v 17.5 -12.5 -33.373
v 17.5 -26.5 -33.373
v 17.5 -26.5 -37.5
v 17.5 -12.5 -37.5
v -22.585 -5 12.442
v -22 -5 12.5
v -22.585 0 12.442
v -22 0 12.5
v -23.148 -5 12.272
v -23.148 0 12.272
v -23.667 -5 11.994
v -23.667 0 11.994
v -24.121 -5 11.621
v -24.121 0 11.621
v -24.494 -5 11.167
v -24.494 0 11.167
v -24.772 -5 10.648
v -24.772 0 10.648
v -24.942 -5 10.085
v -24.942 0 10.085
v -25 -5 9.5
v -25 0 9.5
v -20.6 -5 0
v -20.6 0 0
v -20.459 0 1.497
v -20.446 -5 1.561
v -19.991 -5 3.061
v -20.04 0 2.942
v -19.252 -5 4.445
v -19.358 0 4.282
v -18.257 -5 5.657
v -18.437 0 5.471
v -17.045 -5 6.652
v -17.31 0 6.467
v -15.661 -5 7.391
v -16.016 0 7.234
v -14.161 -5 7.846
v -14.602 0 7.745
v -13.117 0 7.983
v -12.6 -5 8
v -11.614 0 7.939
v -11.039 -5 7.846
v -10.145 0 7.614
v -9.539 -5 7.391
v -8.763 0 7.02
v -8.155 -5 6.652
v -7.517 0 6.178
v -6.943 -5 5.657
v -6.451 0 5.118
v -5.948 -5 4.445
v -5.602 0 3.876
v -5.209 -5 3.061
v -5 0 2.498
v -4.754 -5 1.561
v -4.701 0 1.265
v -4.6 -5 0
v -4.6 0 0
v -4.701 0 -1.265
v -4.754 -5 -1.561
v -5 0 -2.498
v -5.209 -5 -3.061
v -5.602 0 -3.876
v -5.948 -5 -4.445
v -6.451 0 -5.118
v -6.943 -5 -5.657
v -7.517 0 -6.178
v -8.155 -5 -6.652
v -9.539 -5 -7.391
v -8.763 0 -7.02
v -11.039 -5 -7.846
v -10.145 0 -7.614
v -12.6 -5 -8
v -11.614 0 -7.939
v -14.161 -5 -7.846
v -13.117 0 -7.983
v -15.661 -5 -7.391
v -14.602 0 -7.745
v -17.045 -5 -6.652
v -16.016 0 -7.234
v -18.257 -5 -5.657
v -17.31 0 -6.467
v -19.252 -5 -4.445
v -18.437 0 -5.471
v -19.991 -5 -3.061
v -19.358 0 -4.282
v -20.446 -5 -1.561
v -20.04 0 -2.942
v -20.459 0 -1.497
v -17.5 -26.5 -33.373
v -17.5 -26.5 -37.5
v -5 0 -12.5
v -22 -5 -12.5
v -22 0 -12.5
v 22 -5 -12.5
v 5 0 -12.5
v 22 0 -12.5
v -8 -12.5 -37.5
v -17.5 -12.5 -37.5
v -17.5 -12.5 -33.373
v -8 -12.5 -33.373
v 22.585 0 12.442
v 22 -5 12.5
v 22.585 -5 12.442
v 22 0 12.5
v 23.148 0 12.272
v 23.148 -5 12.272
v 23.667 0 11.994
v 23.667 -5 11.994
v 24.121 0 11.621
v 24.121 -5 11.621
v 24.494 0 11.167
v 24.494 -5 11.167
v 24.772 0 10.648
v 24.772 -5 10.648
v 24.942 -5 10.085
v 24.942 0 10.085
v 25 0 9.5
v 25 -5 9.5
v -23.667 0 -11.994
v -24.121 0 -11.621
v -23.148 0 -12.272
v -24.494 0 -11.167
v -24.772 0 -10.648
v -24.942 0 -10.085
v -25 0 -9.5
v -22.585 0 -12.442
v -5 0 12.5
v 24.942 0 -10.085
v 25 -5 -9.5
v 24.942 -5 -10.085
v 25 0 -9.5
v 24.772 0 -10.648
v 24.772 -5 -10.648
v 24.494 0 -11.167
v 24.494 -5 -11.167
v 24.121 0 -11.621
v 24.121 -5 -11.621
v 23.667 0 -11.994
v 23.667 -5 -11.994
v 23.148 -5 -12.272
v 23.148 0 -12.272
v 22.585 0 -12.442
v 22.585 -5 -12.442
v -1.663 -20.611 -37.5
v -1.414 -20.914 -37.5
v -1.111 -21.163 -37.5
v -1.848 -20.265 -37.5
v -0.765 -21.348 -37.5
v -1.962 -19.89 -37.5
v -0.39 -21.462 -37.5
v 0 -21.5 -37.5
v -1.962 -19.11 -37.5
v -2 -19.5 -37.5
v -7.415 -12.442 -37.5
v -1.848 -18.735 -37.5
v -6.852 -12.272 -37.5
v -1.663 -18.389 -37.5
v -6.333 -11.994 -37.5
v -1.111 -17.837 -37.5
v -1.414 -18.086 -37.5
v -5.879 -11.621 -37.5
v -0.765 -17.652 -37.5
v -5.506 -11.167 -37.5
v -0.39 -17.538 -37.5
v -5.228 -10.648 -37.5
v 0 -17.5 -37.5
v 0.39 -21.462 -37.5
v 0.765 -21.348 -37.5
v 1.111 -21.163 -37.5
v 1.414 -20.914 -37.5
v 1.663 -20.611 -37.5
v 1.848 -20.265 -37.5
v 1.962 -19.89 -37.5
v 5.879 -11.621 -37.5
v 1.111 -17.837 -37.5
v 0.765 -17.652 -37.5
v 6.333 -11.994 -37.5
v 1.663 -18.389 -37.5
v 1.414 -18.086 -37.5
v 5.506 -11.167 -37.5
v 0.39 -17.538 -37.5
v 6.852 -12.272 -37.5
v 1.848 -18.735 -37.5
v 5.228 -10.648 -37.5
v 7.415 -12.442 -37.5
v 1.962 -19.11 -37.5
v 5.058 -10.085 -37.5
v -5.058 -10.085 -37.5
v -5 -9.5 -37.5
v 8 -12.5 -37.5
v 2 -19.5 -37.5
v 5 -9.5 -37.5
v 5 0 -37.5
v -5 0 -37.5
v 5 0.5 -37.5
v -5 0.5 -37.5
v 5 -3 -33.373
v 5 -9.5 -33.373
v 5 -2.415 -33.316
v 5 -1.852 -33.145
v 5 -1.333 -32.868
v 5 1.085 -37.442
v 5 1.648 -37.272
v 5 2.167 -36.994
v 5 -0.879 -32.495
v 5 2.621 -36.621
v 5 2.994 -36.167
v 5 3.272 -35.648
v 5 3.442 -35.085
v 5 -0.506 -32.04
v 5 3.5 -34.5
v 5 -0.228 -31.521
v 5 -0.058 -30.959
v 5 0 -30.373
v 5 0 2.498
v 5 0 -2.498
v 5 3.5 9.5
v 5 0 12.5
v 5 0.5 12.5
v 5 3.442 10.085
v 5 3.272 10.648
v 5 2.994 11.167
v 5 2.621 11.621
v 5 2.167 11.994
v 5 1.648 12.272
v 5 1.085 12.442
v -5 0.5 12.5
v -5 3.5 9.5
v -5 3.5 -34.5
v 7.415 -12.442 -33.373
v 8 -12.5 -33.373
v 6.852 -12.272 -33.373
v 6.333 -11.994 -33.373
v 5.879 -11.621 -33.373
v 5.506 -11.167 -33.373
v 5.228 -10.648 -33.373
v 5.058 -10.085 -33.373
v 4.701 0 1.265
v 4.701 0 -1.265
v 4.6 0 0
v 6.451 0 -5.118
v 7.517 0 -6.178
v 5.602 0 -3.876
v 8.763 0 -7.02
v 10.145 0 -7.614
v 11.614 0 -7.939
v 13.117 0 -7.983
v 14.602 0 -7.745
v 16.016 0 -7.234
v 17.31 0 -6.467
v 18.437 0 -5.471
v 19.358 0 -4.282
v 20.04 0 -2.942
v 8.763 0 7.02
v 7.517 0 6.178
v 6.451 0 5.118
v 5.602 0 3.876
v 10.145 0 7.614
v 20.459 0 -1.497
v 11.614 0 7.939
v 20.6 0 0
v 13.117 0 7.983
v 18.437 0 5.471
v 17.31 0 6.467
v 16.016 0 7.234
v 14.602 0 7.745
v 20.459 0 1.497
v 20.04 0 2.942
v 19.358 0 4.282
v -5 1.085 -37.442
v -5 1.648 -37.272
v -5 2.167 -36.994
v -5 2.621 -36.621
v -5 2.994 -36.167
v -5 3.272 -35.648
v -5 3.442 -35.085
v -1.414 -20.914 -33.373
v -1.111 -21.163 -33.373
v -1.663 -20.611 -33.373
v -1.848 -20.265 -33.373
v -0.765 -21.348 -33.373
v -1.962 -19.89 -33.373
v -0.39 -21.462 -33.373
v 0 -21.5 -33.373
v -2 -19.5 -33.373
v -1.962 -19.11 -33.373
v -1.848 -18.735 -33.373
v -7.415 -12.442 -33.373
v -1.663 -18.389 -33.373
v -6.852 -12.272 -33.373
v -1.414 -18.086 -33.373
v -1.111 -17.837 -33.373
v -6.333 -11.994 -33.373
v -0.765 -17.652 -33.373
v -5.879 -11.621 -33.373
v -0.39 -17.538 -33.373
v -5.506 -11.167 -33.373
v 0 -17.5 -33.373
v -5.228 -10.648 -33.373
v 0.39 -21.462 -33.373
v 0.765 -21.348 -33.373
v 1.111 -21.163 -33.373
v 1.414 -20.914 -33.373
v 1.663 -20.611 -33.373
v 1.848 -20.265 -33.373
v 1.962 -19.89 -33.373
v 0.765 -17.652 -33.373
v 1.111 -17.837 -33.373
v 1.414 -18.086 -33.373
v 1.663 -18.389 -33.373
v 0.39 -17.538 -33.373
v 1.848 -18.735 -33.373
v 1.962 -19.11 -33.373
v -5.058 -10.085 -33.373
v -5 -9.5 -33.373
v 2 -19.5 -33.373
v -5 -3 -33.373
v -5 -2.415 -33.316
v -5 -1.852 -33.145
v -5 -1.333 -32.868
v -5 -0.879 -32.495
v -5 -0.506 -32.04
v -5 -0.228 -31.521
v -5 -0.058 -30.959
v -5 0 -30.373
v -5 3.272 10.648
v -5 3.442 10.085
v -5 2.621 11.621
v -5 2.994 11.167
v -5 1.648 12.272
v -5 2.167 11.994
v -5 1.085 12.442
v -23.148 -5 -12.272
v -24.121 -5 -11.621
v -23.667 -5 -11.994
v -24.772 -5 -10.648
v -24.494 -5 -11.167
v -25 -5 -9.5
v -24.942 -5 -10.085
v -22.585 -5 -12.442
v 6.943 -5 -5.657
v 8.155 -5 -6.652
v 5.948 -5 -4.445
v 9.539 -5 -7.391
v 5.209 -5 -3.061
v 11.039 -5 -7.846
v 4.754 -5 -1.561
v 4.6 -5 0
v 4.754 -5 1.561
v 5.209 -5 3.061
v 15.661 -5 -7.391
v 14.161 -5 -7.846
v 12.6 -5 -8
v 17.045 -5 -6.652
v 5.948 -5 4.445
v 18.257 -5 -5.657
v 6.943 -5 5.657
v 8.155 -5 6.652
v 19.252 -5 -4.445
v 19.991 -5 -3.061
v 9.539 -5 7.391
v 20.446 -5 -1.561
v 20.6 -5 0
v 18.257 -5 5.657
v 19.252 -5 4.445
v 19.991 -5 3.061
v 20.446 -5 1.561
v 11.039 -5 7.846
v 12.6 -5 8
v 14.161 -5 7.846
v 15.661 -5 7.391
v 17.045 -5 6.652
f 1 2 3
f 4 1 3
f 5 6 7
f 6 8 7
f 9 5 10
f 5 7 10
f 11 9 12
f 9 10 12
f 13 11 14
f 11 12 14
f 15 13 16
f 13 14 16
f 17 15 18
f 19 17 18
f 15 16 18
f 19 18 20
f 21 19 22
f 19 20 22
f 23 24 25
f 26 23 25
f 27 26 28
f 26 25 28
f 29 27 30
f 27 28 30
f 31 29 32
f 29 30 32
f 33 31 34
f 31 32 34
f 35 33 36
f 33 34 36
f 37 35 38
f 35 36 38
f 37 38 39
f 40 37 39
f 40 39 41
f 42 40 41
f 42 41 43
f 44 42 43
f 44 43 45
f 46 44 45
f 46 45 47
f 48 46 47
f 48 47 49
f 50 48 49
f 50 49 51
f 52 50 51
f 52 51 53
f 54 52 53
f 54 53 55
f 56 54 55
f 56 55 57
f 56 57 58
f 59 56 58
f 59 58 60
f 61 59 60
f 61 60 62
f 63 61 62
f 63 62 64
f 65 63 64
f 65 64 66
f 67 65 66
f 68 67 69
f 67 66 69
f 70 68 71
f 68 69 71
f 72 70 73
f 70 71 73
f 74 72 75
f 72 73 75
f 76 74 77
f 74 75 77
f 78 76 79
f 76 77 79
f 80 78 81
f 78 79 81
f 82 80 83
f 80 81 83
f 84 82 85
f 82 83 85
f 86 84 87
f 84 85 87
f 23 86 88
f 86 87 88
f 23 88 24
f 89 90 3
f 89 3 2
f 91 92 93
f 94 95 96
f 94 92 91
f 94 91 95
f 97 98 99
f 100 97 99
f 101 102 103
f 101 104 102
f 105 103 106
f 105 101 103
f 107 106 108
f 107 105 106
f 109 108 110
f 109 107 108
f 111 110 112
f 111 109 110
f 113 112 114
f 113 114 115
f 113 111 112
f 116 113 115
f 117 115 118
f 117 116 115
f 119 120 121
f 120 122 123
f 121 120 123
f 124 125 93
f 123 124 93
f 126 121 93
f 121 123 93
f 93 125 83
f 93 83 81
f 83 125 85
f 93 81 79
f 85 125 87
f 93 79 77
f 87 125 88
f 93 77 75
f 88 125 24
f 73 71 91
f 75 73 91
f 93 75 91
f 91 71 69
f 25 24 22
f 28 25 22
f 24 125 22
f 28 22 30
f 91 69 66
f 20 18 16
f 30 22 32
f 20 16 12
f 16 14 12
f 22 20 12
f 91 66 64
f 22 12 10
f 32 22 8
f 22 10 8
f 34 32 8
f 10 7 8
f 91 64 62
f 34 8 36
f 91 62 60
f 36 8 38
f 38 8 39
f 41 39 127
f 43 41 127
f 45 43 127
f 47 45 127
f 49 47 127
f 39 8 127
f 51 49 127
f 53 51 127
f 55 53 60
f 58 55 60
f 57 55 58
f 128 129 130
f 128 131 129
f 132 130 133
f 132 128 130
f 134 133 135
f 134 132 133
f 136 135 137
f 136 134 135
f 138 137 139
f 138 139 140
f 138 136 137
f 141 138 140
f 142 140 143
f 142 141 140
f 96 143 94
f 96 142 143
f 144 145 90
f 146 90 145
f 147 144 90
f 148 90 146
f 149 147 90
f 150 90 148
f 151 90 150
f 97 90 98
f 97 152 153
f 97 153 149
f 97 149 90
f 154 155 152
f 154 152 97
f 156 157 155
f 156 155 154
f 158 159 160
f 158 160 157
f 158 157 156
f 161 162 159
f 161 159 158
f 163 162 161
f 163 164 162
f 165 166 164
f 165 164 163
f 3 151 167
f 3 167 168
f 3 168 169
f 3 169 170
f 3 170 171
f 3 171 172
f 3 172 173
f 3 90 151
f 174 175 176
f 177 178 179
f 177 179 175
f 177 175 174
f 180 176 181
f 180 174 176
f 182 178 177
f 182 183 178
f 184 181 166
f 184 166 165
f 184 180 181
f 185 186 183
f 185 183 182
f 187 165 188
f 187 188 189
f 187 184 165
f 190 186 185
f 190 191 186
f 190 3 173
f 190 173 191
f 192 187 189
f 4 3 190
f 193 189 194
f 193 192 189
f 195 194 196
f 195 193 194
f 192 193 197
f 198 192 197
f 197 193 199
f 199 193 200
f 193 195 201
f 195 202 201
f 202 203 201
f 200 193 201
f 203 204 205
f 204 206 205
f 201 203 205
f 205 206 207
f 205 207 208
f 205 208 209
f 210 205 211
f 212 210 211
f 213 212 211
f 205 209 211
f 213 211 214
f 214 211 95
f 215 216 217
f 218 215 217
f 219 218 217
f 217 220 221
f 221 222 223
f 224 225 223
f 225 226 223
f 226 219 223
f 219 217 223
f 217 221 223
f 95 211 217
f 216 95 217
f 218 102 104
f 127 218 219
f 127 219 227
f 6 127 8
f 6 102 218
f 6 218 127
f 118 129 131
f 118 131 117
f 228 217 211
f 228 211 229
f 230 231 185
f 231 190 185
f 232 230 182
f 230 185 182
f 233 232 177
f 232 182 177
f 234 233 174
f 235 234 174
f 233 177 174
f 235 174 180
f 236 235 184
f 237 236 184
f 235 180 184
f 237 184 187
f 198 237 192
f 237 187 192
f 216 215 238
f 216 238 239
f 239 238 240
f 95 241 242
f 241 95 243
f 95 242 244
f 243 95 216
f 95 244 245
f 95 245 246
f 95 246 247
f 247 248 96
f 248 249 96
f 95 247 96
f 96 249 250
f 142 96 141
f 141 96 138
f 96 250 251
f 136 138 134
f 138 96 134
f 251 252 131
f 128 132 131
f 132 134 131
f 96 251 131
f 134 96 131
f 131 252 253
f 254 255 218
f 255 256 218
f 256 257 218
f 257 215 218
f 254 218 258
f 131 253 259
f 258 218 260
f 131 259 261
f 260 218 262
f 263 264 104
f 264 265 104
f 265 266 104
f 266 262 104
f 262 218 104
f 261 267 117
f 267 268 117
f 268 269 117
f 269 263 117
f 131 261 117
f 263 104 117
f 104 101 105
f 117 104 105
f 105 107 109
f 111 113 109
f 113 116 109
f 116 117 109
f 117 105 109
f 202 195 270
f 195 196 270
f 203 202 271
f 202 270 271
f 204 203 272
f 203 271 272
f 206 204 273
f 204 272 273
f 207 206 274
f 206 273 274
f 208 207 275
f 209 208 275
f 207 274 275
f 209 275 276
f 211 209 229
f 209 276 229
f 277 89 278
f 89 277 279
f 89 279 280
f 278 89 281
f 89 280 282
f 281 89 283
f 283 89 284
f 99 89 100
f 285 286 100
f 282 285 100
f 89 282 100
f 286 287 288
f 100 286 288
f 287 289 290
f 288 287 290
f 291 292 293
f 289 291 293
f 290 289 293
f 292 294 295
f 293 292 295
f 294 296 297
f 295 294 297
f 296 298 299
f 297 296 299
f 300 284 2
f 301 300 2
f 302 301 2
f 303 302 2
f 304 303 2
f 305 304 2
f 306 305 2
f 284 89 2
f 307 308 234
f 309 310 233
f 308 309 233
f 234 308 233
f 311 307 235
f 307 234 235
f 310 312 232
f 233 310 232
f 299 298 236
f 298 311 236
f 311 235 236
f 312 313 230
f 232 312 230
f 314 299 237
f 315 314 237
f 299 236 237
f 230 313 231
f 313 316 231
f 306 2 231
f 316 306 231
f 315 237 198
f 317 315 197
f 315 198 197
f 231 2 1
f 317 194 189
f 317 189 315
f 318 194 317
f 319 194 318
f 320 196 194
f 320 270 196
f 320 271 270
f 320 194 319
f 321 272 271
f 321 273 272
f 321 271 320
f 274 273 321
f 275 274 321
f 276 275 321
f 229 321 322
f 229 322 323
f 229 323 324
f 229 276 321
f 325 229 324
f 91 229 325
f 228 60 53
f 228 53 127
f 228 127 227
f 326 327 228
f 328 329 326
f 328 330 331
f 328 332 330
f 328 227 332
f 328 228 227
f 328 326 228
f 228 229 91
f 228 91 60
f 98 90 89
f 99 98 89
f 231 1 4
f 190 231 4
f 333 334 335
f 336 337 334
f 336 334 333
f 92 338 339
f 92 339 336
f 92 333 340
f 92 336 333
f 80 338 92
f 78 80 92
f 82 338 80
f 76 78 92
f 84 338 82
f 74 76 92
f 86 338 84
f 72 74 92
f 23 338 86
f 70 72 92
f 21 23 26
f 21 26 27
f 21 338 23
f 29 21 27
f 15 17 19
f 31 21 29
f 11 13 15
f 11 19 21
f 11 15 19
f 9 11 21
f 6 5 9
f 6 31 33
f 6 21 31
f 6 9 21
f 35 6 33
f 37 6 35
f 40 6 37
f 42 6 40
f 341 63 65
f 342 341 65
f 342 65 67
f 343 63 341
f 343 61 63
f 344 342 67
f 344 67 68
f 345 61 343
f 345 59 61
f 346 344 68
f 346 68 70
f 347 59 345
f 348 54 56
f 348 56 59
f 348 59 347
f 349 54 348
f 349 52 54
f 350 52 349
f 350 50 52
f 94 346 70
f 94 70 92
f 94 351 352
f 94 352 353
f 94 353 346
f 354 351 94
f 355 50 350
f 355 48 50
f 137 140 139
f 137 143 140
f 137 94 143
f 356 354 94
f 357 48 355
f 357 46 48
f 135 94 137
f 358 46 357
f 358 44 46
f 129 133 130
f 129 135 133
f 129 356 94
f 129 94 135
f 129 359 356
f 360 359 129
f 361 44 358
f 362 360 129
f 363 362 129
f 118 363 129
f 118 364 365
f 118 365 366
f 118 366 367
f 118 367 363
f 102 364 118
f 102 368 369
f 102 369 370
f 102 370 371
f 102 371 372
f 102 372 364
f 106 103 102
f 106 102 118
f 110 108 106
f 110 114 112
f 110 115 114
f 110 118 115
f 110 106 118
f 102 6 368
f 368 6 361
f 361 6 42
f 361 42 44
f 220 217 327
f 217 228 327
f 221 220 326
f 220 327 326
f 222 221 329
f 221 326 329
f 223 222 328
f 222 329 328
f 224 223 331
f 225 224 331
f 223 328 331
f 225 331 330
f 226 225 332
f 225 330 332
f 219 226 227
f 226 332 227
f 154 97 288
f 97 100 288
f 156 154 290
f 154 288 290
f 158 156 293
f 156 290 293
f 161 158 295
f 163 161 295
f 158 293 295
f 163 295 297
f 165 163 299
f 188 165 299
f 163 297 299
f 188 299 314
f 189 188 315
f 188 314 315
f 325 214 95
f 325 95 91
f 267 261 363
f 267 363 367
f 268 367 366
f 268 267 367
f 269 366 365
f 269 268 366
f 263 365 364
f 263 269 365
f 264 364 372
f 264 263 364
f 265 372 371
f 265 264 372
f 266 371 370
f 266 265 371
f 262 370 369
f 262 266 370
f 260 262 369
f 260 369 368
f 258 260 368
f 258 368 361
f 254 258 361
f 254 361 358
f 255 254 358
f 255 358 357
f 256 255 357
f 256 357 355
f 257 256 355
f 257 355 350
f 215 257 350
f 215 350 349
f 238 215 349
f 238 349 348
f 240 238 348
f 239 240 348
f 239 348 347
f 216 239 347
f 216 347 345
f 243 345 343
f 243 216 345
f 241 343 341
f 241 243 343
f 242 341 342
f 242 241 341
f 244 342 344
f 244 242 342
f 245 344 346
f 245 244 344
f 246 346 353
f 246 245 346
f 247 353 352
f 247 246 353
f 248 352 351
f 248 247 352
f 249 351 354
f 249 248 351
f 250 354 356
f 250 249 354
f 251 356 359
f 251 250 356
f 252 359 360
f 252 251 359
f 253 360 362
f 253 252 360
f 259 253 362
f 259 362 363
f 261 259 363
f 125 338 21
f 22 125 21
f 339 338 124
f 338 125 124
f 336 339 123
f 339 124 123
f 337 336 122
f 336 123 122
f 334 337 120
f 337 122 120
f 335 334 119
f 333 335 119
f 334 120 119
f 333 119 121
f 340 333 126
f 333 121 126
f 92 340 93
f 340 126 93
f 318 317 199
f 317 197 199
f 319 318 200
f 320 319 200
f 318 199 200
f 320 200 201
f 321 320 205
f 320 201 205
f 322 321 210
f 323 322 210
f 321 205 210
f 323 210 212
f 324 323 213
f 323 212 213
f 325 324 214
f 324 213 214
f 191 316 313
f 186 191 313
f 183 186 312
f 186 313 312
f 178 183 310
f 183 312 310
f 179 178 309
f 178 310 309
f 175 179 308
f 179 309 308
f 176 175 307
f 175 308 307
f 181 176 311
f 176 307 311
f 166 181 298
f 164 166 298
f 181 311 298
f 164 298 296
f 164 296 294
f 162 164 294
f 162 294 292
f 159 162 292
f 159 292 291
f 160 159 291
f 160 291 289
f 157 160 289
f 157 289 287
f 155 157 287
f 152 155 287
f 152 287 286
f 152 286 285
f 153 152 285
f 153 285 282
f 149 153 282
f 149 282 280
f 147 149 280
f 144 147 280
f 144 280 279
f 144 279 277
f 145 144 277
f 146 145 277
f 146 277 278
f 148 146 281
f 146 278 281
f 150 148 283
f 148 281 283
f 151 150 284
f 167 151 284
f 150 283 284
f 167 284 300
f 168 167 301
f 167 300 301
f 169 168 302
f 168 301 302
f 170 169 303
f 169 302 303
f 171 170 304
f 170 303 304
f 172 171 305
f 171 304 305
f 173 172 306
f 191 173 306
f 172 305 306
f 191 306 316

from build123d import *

# Parameters (mm, degrees)
SKETCH1_W                      = 50
SKETCH1_H                      = 25
BOSS_EXTRUDE1_DEPTH            = 5
SKETCH2_W                      = 10
SKETCH2_H                      = 50
BOSS_EXTRUDE2_DEPTH            = 3.5
SKETCH3_W                      = 10
SKETCH3_H                      = 4.126638733
BOSS_EXTRUDE3_DEPTH            = 26.5
SKETCH4_W                      = 4.126638733
SKETCH4_H                      = 14
BOSS_EXTRUDE4_DEPTH            = 12.5
SKETCH5_W                      = 4.126638733
SKETCH5_H                      = 14
BOSS_EXTRUDE5_DEPTH            = 12.5
F_4_0_4_DIAMETER_HOLE1_D       = 4
F_4_0_4_DIAMETER_HOLE1_DEPTH   = 50
F_16_0_16_DIAMETER_HOLE1_D     = 16
F_16_0_16_DIAMETER_HOLE1_DEPTH = 5
FILLET1_R                      = 3


with BuildPart() as part:
    # Sketch1 → Boss-Extrude1 (new body)
    with BuildSketch(Plane.XZ.offset(5)):
        Rectangle(SKETCH1_W, SKETCH1_H)
    extrude(amount=-BOSS_EXTRUDE1_DEPTH)

    # Sketch2 → Boss-Extrude2 (add)
    with BuildSketch(Plane(origin=(0, 0, 0), x_dir=(-1, 0, 0), z_dir=(0, 1, 0))):
        with Locations((0, -12.5)):
            Rectangle(SKETCH2_W, SKETCH2_H)
    extrude(amount=BOSS_EXTRUDE2_DEPTH)

    # Sketch3 → Boss-Extrude3 (add)
    with BuildSketch(Plane.XZ):
        with Locations((0, -35.436680634)):
            Rectangle(SKETCH3_W, SKETCH3_H)
    extrude(amount=BOSS_EXTRUDE3_DEPTH)

    # Sketch4 → Boss-Extrude4 (add)
    with BuildSketch(Plane(origin=(5, 0, 0), x_dir=(0, 0, -1), z_dir=(1, 0, 0))):
        with Locations((35.436680634, -19.5)):
            Rectangle(SKETCH4_W, SKETCH4_H)
    extrude(amount=BOSS_EXTRUDE4_DEPTH)

    # Sketch5 → Boss-Extrude5 (add)
    with BuildSketch(Plane.ZY.offset(5)):
        with Locations((-35.436680634, -19.5)):
            Rectangle(SKETCH5_W, SKETCH5_H)
    extrude(amount=BOSS_EXTRUDE5_DEPTH)

    # Ø4.0 (4) Diameter Hole1
    with Locations(Plane(origin=(0, 0, -37.5), x_dir=(-1, 0, 0), z_dir=(0, 0, -1))):
        with Locations((0, -19.5)):
            Hole(F_4_0_4_DIAMETER_HOLE1_D / 2, depth=F_4_0_4_DIAMETER_HOLE1_DEPTH)

    # Ø16.0 (16) Diameter Hole1
    with Locations(Plane.XZ.offset(5)):
        with Locations((-12.6, 0)):
            f_16_0_16_diameter_hole1 = Hole(F_16_0_16_DIAMETER_HOLE1_D / 2, depth=F_16_0_16_DIAMETER_HOLE1_DEPTH)

    # Fillet1
    fillet1_edges = [part.edges().sort_by_distance(p)[0] for p in [
        (0, 3.5, 12.5),
        (0, 3.5, -37.5),
        (0, 0, -33.373361267),
        (5, -12.5, -35.436680634),
        (-5, -12.5, -35.436680634),
        (25, -2.5, 12.5),
        (25, -2.5, -12.5),
        (-25, -2.5, -12.5),
        (-25, -2.5, 12.5),
    ]]
    fillet(fillet1_edges, radius=FILLET1_R)

    # Mirror1: Ø16.0 (16) Diameter Hole1 across plane
    add(f_16_0_16_diameter_hole1.mirror(Plane(origin=(0, 0, 0), x_dir=(0, 0, 1), z_dir=(1, 0, 0))), mode=Mode.SUBTRACT)


solid = part.part
